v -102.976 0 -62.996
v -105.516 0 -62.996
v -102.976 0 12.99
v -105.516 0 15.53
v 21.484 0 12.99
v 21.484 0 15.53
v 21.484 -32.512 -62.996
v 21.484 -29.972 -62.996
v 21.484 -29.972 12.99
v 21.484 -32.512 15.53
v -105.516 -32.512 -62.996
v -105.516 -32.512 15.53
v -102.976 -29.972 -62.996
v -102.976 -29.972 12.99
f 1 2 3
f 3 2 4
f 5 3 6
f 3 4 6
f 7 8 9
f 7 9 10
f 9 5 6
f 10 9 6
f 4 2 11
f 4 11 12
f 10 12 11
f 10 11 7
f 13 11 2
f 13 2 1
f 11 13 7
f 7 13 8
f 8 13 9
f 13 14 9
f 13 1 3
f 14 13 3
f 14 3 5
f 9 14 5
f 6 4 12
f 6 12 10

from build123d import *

# Parameters (mm, degrees)
F0_W     = 127
F0_H     = 78.5267129702
F1_DEPTH = 32.512
F2_T     = -2.54


# Not quite as in the source:
# - a feature of the source that left no trace in its solid (it failed there, or was rolled back) is left out


with BuildPart() as f1:
    # F0 (on Front) → F1 (new body)
    with BuildSketch(Plane.XZ):
        with Locations((-42.0160433277, -23.7329155207)):
            Rectangle(F0_W, F0_H)
    extrude(amount=F1_DEPTH)

    # F2
    f2_openings = [f1.faces().sort_by_distance(p)[0] for p in [
        (21.483957, -16.256, -23.732916),
        (-42.016043, -16.256, -62.996272),
        (-42.016043, 0, -23.732916),
    ]]
    offset(amount=F2_T, openings=f2_openings)


solid = f1.part
